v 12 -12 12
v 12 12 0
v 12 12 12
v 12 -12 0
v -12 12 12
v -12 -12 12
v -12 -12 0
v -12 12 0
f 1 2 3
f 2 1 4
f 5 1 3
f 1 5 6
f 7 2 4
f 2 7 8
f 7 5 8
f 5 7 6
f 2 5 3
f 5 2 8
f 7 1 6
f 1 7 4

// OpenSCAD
$fn = 50;

difference() {
	union() {
		translate(v = [-12.0, -12.0, 0]) {
			cube(size = [24, 24, 12]);
		}
	}
	union();
}
